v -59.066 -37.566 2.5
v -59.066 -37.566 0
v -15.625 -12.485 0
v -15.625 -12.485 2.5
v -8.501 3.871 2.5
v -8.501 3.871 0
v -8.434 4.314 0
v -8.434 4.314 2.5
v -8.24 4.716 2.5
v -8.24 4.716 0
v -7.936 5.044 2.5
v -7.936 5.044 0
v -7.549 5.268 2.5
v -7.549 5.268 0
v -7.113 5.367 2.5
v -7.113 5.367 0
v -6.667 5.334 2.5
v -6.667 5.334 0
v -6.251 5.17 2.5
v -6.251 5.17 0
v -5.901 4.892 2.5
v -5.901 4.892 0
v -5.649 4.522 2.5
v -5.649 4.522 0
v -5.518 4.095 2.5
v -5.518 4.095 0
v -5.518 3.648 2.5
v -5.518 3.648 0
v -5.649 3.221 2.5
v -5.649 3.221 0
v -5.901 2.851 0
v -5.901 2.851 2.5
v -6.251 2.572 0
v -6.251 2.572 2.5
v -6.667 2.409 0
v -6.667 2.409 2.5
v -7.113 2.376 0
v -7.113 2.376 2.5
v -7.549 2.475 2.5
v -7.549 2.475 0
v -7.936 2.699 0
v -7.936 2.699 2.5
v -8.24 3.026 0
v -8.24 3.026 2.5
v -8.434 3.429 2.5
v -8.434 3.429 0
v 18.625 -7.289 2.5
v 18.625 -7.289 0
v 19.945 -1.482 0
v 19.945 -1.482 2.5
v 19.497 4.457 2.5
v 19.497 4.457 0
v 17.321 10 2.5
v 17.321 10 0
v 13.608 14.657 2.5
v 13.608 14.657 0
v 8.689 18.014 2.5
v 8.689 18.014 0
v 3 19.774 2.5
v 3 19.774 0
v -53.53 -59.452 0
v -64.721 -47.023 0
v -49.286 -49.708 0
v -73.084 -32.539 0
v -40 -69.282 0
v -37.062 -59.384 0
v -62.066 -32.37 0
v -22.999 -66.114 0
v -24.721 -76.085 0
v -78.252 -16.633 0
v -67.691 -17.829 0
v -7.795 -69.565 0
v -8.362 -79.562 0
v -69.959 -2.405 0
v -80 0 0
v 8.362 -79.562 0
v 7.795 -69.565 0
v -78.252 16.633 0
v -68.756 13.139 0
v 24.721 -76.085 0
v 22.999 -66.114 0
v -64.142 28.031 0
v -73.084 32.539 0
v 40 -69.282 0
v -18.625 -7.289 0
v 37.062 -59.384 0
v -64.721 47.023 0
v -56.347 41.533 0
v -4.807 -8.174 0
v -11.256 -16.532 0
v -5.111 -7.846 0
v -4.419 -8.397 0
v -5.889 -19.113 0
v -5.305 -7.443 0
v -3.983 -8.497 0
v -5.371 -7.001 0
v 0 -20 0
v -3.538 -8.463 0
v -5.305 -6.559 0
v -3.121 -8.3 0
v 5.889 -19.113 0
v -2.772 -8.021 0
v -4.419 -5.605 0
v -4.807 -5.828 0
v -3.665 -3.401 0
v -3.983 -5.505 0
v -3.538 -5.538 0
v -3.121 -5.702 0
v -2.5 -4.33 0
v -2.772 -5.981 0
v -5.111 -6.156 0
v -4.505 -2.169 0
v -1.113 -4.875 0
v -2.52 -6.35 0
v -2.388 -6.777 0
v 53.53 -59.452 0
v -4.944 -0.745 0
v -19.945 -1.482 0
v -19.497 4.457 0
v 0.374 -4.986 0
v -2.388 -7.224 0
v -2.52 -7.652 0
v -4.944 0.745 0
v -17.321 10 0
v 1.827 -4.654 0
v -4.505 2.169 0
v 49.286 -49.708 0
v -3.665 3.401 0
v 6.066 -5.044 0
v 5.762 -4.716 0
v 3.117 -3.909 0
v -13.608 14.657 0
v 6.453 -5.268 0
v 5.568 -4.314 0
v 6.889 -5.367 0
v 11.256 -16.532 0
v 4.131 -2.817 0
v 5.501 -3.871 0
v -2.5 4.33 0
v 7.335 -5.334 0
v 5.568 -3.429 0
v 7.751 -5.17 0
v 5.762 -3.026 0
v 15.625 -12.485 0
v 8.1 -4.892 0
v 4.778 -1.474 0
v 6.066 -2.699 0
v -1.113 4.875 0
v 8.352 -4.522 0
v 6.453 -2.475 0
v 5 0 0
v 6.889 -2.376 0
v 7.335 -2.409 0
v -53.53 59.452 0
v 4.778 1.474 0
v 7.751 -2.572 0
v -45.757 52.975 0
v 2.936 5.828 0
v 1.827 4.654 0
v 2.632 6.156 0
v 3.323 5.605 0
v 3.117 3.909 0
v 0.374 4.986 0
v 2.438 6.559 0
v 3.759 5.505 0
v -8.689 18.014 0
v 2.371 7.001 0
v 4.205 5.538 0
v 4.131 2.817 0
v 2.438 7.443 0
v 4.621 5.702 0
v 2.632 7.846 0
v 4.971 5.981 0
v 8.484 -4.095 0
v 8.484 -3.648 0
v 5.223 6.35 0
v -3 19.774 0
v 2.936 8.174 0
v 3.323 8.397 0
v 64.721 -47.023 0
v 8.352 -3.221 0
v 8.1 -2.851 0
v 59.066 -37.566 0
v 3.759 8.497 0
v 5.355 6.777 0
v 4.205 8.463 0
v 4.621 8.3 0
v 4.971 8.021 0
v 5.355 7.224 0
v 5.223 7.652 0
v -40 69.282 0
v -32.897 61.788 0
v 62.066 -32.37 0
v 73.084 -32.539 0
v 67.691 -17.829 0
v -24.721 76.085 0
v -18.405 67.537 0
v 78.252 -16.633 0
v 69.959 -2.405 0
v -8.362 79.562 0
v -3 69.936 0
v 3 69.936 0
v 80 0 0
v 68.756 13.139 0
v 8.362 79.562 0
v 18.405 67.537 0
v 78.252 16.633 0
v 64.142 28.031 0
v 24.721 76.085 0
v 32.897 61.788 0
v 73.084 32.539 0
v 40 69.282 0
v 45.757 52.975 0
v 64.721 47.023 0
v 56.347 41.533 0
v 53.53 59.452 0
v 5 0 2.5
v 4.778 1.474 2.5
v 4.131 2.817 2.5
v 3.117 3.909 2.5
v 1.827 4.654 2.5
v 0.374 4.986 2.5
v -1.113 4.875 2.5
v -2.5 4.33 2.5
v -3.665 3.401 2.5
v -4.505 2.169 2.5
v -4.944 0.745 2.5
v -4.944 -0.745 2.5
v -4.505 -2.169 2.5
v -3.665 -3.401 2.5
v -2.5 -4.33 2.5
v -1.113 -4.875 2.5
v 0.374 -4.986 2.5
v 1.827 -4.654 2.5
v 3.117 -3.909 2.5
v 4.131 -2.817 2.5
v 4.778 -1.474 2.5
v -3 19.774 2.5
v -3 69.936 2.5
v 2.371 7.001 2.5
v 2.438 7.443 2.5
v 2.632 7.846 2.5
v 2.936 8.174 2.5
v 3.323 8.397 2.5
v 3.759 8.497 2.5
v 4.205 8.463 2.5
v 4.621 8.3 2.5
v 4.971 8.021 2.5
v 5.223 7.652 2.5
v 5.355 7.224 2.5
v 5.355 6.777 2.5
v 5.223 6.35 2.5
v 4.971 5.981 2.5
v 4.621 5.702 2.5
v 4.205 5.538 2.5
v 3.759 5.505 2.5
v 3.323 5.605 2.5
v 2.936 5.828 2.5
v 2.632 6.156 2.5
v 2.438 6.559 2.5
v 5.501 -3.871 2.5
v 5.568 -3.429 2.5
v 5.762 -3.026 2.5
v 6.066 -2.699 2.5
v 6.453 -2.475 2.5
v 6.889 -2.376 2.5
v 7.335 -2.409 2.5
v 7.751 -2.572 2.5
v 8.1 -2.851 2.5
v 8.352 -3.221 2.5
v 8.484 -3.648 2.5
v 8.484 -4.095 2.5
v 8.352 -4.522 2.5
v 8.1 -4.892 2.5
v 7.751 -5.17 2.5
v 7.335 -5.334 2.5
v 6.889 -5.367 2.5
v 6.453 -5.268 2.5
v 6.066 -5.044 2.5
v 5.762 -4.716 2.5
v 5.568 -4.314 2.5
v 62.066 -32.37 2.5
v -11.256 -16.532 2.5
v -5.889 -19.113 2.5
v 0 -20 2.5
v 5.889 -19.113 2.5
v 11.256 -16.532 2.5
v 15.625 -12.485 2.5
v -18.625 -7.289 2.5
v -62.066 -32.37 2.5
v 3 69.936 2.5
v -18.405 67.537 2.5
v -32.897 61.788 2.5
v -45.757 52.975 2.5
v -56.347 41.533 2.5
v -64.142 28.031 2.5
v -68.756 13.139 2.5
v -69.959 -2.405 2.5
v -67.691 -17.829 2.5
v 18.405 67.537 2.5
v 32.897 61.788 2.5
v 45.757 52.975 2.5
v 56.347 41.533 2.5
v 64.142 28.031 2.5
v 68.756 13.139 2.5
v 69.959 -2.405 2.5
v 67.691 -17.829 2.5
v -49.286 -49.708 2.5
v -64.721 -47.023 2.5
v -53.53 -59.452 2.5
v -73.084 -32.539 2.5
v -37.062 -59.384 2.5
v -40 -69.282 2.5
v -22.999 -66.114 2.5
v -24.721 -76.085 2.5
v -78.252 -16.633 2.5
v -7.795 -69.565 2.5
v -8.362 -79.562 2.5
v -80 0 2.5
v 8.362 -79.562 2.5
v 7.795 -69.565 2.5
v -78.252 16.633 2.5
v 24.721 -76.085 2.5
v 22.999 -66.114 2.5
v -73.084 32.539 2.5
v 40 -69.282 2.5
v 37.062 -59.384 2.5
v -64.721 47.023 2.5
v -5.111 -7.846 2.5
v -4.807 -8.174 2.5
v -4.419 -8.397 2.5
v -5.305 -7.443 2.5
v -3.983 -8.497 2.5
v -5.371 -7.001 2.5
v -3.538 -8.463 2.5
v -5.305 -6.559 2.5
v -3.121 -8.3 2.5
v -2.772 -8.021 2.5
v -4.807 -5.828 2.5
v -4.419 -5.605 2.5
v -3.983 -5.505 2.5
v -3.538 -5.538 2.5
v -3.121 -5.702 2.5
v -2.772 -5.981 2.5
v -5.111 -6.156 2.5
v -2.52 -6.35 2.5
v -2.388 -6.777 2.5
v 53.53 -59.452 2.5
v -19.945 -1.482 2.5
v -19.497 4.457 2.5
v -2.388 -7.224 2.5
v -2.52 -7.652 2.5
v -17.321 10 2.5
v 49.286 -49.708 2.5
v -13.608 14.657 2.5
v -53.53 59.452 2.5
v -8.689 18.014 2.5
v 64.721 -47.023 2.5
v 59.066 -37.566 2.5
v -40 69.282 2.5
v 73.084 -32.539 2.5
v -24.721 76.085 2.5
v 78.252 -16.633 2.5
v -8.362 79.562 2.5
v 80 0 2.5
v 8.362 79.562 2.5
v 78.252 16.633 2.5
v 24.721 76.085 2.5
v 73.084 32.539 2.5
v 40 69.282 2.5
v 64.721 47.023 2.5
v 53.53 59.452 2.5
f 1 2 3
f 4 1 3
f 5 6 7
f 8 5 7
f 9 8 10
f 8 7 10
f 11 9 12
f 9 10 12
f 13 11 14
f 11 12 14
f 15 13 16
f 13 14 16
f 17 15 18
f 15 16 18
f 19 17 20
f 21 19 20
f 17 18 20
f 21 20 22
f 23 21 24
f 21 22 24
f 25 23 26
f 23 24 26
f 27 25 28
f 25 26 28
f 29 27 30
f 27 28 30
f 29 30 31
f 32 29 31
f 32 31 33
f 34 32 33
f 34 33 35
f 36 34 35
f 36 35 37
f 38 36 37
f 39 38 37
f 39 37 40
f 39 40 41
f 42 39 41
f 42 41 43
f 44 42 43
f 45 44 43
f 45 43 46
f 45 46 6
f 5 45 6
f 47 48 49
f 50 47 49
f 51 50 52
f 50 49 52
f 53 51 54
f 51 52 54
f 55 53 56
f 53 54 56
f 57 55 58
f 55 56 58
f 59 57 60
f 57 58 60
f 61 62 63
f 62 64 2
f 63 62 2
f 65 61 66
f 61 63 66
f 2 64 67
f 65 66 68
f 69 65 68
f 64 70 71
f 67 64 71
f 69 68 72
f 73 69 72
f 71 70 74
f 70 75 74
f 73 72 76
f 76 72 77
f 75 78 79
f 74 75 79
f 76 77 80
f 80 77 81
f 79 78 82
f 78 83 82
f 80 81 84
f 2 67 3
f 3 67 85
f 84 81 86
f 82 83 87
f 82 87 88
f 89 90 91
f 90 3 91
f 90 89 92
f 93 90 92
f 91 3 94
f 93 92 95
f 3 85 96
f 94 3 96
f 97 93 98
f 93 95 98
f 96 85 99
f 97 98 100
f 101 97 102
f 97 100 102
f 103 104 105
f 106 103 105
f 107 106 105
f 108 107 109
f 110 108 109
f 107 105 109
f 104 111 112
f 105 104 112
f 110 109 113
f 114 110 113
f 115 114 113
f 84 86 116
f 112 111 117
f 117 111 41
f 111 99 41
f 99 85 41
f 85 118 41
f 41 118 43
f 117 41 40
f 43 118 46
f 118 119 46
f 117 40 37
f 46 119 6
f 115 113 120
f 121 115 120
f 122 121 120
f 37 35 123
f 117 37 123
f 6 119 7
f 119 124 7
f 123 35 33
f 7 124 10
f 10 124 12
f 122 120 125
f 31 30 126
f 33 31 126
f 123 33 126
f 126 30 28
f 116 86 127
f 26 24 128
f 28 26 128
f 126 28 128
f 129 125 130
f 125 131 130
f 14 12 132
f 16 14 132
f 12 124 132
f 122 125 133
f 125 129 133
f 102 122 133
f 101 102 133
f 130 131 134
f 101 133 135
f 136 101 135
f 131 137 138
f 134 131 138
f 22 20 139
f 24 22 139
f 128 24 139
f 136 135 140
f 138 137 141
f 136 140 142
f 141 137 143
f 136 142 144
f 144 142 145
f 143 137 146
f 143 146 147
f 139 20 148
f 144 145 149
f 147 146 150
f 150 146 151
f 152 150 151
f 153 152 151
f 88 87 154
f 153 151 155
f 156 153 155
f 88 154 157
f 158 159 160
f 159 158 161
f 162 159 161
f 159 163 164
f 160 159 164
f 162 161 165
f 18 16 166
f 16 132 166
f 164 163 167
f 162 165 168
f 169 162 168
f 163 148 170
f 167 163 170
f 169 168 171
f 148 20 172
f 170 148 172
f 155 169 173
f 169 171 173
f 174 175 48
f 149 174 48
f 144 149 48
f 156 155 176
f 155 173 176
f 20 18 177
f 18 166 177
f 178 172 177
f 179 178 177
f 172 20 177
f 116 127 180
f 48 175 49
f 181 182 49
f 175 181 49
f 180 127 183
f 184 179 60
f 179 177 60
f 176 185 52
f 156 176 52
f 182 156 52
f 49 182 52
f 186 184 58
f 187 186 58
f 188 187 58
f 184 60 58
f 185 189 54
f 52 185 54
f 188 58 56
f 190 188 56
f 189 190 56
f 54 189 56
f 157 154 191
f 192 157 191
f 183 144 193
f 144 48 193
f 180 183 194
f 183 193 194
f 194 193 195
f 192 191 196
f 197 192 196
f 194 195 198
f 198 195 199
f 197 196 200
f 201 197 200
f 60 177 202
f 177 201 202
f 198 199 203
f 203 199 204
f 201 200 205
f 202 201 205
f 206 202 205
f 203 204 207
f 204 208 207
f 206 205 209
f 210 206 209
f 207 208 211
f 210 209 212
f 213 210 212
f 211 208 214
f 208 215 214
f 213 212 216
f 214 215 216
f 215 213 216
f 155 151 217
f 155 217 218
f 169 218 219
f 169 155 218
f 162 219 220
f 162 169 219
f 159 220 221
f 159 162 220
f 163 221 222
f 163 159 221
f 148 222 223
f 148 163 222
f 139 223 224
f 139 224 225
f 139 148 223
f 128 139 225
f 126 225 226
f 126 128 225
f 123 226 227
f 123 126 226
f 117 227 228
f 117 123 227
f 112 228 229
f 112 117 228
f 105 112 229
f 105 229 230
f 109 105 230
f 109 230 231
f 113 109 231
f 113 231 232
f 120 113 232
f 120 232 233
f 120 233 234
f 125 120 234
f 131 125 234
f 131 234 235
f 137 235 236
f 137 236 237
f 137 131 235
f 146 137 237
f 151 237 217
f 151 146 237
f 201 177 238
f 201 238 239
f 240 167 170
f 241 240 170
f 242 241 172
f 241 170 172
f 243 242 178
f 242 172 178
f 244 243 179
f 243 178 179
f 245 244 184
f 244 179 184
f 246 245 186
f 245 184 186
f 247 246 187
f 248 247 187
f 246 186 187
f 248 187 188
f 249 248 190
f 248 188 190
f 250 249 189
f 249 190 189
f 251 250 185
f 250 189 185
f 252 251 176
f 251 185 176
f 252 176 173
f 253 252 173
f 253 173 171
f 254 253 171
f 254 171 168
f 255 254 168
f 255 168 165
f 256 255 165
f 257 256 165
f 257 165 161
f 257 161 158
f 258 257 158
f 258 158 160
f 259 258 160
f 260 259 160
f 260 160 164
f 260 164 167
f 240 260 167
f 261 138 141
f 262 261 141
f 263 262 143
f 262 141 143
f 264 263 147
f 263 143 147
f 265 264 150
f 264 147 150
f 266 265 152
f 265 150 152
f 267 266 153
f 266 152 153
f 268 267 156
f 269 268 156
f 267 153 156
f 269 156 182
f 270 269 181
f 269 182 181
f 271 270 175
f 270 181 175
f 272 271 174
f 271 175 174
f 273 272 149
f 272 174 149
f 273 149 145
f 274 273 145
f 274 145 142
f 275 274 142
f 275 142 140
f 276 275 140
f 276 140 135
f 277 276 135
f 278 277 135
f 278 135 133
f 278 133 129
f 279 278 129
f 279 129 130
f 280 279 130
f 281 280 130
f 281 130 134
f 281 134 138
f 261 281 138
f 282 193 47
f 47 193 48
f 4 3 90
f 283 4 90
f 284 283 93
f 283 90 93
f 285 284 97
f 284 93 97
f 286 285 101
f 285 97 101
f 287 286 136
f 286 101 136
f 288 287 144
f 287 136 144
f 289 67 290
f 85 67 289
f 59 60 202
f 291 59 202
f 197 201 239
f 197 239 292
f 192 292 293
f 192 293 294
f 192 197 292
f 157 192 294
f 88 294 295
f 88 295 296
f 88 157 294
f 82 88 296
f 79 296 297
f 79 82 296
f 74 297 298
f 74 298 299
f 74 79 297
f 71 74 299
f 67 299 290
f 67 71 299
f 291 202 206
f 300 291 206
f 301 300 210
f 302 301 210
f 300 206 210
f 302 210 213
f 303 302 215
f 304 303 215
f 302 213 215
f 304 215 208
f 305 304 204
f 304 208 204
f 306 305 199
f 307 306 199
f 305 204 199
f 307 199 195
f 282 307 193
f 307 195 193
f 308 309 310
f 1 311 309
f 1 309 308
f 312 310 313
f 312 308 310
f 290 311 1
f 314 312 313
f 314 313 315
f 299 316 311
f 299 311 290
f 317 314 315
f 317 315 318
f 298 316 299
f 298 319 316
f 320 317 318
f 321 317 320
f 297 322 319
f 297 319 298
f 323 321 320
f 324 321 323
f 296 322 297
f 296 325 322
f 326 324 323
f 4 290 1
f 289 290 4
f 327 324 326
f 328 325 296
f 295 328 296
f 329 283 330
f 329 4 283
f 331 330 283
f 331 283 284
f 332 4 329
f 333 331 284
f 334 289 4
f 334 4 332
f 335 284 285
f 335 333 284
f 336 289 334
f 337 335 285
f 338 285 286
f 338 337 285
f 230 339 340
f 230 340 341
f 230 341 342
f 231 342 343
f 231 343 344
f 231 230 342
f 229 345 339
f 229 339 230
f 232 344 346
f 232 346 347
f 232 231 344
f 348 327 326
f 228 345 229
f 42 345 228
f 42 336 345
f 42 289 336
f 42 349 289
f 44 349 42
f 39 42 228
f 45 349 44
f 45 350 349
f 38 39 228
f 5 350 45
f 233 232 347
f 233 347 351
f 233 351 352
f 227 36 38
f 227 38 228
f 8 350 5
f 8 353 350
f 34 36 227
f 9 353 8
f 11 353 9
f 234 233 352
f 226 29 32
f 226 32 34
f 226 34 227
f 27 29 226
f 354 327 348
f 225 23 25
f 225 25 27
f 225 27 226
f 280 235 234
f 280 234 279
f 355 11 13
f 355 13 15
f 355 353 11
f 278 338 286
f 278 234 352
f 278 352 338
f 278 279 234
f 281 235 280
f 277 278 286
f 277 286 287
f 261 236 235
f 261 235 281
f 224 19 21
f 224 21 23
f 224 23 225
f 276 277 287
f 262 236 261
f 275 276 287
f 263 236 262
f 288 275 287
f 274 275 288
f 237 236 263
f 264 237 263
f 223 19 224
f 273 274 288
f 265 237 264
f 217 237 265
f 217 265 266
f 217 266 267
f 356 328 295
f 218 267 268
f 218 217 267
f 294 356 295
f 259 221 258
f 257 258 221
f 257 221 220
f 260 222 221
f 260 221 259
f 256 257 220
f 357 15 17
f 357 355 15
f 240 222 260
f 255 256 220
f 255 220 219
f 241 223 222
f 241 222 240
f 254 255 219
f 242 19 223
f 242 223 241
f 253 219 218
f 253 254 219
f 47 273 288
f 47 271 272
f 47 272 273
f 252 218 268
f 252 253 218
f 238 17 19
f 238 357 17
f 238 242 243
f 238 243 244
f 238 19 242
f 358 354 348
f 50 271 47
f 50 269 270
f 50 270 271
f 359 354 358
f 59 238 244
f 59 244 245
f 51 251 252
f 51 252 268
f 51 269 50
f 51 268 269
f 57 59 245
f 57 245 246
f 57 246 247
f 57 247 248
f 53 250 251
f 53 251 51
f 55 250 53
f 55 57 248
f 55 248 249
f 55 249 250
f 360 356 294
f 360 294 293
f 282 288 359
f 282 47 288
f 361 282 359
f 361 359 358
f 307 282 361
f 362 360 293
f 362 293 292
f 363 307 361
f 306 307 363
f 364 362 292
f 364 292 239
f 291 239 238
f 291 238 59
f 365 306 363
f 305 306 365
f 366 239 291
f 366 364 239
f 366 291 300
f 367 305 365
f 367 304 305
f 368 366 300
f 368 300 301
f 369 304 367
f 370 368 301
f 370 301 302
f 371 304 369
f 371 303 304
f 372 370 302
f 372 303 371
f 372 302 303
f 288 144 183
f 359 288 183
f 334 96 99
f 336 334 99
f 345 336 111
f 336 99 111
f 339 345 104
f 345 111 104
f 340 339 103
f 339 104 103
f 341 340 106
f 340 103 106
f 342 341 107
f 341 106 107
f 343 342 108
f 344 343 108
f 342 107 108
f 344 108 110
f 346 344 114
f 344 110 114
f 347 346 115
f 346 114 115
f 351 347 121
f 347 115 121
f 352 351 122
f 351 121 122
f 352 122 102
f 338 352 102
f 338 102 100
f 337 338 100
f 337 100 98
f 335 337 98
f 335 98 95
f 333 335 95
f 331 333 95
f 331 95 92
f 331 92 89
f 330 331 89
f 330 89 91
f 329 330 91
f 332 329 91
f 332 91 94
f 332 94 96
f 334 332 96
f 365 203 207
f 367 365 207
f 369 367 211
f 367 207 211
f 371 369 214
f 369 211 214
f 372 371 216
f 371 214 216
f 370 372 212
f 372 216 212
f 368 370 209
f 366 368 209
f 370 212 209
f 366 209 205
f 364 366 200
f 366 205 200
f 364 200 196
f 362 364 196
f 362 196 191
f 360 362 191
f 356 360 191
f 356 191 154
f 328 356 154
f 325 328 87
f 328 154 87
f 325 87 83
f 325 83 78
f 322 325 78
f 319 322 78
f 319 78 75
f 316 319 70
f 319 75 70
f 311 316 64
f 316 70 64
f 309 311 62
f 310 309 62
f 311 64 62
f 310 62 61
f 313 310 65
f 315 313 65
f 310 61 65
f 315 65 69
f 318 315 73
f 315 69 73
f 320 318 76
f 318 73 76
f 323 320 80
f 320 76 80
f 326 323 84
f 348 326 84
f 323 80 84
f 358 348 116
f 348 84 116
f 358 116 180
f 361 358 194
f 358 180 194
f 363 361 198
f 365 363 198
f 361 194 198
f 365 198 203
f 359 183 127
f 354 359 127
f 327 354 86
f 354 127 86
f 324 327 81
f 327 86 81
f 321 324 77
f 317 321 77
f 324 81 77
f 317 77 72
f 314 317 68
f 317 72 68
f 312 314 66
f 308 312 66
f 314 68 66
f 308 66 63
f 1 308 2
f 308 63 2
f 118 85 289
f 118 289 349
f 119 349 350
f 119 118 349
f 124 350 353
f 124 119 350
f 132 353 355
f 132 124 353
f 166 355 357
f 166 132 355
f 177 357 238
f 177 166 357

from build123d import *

# Parameters (mm, degrees)
SKETCH_1_R          = 80
SKETCH_1_R_2        = 5
EXTRUDE_1_DEPTH     = 2.5
SKETCH_2_R          = 1.5
CUT_EXTRUDE_1_DEPTH = 114.164702978


with BuildPart() as part:
    # 草图1 → 凸台-拉伸1 (new body)
    with BuildSketch(Plane.XY):
        Circle(SKETCH_1_R)
        Circle(SKETCH_1_R_2, mode=Mode.SUBTRACT)
        with BuildLine():
            Line((-3, 19.773719933), (-3, 69.93568474))
            ThreePointArc((-3, 69.93568474), (-60.621778265, 35), (-62.066079616, -32.369766158))
            Line((-62.066079616, -32.369766158), (-18.62454379, -7.288783755))
            ThreePointArc((-18.62454379, -7.288783755), (-17.320508076, 10), (-3, 19.773719933))
        make_face(mode=Mode.SUBTRACT)
        with BuildLine():
            Line((3, 19.773719933), (3, 69.93568474))
            ThreePointArc((3, 69.93568474), (60.621778265, 35), (62.066079616, -32.369766158))
            Line((62.066079616, -32.369766158), (18.62454379, -7.288783755))
            ThreePointArc((18.62454379, -7.288783755), (17.320508076, 10), (3, 19.773719933))
        make_face(mode=Mode.SUBTRACT)
        with BuildLine():
            Line((15.62454379, -12.484936178), (59.066079616, -37.565918581))
            ThreePointArc((59.066079616, -37.565918581), (0, -70), (-59.066079616, -37.565918581))
            Line((-59.066079616, -37.565918581), (-15.62454379, -12.484936178))
            ThreePointArc((-15.62454379, -12.484936178), (0, -20), (15.62454379, -12.484936178))
        make_face(mode=Mode.SUBTRACT)
    extrude(amount=EXTRUDE_1_DEPTH)

    # 草图2 → 切除-拉伸1 (cut, through all)
    with BuildSketch(Plane(origin=(0, 0, 0), x_dir=(-1, 0, 0), z_dir=(0, 0, -1))):
        with Locations((-7.000881354, -3.871389966)):
            Circle(SKETCH_2_R)
        with Locations((-3.871389966, 7.000881354)):
            Circle(SKETCH_2_R)
        with Locations((7.000881354, 3.871389966)):
            Circle(SKETCH_2_R)
        with Locations((3.871389966, -7.000881354)):
            Circle(SKETCH_2_R)
    extrude(amount=-CUT_EXTRUDE_1_DEPTH, mode=Mode.SUBTRACT)


solid = part.part
